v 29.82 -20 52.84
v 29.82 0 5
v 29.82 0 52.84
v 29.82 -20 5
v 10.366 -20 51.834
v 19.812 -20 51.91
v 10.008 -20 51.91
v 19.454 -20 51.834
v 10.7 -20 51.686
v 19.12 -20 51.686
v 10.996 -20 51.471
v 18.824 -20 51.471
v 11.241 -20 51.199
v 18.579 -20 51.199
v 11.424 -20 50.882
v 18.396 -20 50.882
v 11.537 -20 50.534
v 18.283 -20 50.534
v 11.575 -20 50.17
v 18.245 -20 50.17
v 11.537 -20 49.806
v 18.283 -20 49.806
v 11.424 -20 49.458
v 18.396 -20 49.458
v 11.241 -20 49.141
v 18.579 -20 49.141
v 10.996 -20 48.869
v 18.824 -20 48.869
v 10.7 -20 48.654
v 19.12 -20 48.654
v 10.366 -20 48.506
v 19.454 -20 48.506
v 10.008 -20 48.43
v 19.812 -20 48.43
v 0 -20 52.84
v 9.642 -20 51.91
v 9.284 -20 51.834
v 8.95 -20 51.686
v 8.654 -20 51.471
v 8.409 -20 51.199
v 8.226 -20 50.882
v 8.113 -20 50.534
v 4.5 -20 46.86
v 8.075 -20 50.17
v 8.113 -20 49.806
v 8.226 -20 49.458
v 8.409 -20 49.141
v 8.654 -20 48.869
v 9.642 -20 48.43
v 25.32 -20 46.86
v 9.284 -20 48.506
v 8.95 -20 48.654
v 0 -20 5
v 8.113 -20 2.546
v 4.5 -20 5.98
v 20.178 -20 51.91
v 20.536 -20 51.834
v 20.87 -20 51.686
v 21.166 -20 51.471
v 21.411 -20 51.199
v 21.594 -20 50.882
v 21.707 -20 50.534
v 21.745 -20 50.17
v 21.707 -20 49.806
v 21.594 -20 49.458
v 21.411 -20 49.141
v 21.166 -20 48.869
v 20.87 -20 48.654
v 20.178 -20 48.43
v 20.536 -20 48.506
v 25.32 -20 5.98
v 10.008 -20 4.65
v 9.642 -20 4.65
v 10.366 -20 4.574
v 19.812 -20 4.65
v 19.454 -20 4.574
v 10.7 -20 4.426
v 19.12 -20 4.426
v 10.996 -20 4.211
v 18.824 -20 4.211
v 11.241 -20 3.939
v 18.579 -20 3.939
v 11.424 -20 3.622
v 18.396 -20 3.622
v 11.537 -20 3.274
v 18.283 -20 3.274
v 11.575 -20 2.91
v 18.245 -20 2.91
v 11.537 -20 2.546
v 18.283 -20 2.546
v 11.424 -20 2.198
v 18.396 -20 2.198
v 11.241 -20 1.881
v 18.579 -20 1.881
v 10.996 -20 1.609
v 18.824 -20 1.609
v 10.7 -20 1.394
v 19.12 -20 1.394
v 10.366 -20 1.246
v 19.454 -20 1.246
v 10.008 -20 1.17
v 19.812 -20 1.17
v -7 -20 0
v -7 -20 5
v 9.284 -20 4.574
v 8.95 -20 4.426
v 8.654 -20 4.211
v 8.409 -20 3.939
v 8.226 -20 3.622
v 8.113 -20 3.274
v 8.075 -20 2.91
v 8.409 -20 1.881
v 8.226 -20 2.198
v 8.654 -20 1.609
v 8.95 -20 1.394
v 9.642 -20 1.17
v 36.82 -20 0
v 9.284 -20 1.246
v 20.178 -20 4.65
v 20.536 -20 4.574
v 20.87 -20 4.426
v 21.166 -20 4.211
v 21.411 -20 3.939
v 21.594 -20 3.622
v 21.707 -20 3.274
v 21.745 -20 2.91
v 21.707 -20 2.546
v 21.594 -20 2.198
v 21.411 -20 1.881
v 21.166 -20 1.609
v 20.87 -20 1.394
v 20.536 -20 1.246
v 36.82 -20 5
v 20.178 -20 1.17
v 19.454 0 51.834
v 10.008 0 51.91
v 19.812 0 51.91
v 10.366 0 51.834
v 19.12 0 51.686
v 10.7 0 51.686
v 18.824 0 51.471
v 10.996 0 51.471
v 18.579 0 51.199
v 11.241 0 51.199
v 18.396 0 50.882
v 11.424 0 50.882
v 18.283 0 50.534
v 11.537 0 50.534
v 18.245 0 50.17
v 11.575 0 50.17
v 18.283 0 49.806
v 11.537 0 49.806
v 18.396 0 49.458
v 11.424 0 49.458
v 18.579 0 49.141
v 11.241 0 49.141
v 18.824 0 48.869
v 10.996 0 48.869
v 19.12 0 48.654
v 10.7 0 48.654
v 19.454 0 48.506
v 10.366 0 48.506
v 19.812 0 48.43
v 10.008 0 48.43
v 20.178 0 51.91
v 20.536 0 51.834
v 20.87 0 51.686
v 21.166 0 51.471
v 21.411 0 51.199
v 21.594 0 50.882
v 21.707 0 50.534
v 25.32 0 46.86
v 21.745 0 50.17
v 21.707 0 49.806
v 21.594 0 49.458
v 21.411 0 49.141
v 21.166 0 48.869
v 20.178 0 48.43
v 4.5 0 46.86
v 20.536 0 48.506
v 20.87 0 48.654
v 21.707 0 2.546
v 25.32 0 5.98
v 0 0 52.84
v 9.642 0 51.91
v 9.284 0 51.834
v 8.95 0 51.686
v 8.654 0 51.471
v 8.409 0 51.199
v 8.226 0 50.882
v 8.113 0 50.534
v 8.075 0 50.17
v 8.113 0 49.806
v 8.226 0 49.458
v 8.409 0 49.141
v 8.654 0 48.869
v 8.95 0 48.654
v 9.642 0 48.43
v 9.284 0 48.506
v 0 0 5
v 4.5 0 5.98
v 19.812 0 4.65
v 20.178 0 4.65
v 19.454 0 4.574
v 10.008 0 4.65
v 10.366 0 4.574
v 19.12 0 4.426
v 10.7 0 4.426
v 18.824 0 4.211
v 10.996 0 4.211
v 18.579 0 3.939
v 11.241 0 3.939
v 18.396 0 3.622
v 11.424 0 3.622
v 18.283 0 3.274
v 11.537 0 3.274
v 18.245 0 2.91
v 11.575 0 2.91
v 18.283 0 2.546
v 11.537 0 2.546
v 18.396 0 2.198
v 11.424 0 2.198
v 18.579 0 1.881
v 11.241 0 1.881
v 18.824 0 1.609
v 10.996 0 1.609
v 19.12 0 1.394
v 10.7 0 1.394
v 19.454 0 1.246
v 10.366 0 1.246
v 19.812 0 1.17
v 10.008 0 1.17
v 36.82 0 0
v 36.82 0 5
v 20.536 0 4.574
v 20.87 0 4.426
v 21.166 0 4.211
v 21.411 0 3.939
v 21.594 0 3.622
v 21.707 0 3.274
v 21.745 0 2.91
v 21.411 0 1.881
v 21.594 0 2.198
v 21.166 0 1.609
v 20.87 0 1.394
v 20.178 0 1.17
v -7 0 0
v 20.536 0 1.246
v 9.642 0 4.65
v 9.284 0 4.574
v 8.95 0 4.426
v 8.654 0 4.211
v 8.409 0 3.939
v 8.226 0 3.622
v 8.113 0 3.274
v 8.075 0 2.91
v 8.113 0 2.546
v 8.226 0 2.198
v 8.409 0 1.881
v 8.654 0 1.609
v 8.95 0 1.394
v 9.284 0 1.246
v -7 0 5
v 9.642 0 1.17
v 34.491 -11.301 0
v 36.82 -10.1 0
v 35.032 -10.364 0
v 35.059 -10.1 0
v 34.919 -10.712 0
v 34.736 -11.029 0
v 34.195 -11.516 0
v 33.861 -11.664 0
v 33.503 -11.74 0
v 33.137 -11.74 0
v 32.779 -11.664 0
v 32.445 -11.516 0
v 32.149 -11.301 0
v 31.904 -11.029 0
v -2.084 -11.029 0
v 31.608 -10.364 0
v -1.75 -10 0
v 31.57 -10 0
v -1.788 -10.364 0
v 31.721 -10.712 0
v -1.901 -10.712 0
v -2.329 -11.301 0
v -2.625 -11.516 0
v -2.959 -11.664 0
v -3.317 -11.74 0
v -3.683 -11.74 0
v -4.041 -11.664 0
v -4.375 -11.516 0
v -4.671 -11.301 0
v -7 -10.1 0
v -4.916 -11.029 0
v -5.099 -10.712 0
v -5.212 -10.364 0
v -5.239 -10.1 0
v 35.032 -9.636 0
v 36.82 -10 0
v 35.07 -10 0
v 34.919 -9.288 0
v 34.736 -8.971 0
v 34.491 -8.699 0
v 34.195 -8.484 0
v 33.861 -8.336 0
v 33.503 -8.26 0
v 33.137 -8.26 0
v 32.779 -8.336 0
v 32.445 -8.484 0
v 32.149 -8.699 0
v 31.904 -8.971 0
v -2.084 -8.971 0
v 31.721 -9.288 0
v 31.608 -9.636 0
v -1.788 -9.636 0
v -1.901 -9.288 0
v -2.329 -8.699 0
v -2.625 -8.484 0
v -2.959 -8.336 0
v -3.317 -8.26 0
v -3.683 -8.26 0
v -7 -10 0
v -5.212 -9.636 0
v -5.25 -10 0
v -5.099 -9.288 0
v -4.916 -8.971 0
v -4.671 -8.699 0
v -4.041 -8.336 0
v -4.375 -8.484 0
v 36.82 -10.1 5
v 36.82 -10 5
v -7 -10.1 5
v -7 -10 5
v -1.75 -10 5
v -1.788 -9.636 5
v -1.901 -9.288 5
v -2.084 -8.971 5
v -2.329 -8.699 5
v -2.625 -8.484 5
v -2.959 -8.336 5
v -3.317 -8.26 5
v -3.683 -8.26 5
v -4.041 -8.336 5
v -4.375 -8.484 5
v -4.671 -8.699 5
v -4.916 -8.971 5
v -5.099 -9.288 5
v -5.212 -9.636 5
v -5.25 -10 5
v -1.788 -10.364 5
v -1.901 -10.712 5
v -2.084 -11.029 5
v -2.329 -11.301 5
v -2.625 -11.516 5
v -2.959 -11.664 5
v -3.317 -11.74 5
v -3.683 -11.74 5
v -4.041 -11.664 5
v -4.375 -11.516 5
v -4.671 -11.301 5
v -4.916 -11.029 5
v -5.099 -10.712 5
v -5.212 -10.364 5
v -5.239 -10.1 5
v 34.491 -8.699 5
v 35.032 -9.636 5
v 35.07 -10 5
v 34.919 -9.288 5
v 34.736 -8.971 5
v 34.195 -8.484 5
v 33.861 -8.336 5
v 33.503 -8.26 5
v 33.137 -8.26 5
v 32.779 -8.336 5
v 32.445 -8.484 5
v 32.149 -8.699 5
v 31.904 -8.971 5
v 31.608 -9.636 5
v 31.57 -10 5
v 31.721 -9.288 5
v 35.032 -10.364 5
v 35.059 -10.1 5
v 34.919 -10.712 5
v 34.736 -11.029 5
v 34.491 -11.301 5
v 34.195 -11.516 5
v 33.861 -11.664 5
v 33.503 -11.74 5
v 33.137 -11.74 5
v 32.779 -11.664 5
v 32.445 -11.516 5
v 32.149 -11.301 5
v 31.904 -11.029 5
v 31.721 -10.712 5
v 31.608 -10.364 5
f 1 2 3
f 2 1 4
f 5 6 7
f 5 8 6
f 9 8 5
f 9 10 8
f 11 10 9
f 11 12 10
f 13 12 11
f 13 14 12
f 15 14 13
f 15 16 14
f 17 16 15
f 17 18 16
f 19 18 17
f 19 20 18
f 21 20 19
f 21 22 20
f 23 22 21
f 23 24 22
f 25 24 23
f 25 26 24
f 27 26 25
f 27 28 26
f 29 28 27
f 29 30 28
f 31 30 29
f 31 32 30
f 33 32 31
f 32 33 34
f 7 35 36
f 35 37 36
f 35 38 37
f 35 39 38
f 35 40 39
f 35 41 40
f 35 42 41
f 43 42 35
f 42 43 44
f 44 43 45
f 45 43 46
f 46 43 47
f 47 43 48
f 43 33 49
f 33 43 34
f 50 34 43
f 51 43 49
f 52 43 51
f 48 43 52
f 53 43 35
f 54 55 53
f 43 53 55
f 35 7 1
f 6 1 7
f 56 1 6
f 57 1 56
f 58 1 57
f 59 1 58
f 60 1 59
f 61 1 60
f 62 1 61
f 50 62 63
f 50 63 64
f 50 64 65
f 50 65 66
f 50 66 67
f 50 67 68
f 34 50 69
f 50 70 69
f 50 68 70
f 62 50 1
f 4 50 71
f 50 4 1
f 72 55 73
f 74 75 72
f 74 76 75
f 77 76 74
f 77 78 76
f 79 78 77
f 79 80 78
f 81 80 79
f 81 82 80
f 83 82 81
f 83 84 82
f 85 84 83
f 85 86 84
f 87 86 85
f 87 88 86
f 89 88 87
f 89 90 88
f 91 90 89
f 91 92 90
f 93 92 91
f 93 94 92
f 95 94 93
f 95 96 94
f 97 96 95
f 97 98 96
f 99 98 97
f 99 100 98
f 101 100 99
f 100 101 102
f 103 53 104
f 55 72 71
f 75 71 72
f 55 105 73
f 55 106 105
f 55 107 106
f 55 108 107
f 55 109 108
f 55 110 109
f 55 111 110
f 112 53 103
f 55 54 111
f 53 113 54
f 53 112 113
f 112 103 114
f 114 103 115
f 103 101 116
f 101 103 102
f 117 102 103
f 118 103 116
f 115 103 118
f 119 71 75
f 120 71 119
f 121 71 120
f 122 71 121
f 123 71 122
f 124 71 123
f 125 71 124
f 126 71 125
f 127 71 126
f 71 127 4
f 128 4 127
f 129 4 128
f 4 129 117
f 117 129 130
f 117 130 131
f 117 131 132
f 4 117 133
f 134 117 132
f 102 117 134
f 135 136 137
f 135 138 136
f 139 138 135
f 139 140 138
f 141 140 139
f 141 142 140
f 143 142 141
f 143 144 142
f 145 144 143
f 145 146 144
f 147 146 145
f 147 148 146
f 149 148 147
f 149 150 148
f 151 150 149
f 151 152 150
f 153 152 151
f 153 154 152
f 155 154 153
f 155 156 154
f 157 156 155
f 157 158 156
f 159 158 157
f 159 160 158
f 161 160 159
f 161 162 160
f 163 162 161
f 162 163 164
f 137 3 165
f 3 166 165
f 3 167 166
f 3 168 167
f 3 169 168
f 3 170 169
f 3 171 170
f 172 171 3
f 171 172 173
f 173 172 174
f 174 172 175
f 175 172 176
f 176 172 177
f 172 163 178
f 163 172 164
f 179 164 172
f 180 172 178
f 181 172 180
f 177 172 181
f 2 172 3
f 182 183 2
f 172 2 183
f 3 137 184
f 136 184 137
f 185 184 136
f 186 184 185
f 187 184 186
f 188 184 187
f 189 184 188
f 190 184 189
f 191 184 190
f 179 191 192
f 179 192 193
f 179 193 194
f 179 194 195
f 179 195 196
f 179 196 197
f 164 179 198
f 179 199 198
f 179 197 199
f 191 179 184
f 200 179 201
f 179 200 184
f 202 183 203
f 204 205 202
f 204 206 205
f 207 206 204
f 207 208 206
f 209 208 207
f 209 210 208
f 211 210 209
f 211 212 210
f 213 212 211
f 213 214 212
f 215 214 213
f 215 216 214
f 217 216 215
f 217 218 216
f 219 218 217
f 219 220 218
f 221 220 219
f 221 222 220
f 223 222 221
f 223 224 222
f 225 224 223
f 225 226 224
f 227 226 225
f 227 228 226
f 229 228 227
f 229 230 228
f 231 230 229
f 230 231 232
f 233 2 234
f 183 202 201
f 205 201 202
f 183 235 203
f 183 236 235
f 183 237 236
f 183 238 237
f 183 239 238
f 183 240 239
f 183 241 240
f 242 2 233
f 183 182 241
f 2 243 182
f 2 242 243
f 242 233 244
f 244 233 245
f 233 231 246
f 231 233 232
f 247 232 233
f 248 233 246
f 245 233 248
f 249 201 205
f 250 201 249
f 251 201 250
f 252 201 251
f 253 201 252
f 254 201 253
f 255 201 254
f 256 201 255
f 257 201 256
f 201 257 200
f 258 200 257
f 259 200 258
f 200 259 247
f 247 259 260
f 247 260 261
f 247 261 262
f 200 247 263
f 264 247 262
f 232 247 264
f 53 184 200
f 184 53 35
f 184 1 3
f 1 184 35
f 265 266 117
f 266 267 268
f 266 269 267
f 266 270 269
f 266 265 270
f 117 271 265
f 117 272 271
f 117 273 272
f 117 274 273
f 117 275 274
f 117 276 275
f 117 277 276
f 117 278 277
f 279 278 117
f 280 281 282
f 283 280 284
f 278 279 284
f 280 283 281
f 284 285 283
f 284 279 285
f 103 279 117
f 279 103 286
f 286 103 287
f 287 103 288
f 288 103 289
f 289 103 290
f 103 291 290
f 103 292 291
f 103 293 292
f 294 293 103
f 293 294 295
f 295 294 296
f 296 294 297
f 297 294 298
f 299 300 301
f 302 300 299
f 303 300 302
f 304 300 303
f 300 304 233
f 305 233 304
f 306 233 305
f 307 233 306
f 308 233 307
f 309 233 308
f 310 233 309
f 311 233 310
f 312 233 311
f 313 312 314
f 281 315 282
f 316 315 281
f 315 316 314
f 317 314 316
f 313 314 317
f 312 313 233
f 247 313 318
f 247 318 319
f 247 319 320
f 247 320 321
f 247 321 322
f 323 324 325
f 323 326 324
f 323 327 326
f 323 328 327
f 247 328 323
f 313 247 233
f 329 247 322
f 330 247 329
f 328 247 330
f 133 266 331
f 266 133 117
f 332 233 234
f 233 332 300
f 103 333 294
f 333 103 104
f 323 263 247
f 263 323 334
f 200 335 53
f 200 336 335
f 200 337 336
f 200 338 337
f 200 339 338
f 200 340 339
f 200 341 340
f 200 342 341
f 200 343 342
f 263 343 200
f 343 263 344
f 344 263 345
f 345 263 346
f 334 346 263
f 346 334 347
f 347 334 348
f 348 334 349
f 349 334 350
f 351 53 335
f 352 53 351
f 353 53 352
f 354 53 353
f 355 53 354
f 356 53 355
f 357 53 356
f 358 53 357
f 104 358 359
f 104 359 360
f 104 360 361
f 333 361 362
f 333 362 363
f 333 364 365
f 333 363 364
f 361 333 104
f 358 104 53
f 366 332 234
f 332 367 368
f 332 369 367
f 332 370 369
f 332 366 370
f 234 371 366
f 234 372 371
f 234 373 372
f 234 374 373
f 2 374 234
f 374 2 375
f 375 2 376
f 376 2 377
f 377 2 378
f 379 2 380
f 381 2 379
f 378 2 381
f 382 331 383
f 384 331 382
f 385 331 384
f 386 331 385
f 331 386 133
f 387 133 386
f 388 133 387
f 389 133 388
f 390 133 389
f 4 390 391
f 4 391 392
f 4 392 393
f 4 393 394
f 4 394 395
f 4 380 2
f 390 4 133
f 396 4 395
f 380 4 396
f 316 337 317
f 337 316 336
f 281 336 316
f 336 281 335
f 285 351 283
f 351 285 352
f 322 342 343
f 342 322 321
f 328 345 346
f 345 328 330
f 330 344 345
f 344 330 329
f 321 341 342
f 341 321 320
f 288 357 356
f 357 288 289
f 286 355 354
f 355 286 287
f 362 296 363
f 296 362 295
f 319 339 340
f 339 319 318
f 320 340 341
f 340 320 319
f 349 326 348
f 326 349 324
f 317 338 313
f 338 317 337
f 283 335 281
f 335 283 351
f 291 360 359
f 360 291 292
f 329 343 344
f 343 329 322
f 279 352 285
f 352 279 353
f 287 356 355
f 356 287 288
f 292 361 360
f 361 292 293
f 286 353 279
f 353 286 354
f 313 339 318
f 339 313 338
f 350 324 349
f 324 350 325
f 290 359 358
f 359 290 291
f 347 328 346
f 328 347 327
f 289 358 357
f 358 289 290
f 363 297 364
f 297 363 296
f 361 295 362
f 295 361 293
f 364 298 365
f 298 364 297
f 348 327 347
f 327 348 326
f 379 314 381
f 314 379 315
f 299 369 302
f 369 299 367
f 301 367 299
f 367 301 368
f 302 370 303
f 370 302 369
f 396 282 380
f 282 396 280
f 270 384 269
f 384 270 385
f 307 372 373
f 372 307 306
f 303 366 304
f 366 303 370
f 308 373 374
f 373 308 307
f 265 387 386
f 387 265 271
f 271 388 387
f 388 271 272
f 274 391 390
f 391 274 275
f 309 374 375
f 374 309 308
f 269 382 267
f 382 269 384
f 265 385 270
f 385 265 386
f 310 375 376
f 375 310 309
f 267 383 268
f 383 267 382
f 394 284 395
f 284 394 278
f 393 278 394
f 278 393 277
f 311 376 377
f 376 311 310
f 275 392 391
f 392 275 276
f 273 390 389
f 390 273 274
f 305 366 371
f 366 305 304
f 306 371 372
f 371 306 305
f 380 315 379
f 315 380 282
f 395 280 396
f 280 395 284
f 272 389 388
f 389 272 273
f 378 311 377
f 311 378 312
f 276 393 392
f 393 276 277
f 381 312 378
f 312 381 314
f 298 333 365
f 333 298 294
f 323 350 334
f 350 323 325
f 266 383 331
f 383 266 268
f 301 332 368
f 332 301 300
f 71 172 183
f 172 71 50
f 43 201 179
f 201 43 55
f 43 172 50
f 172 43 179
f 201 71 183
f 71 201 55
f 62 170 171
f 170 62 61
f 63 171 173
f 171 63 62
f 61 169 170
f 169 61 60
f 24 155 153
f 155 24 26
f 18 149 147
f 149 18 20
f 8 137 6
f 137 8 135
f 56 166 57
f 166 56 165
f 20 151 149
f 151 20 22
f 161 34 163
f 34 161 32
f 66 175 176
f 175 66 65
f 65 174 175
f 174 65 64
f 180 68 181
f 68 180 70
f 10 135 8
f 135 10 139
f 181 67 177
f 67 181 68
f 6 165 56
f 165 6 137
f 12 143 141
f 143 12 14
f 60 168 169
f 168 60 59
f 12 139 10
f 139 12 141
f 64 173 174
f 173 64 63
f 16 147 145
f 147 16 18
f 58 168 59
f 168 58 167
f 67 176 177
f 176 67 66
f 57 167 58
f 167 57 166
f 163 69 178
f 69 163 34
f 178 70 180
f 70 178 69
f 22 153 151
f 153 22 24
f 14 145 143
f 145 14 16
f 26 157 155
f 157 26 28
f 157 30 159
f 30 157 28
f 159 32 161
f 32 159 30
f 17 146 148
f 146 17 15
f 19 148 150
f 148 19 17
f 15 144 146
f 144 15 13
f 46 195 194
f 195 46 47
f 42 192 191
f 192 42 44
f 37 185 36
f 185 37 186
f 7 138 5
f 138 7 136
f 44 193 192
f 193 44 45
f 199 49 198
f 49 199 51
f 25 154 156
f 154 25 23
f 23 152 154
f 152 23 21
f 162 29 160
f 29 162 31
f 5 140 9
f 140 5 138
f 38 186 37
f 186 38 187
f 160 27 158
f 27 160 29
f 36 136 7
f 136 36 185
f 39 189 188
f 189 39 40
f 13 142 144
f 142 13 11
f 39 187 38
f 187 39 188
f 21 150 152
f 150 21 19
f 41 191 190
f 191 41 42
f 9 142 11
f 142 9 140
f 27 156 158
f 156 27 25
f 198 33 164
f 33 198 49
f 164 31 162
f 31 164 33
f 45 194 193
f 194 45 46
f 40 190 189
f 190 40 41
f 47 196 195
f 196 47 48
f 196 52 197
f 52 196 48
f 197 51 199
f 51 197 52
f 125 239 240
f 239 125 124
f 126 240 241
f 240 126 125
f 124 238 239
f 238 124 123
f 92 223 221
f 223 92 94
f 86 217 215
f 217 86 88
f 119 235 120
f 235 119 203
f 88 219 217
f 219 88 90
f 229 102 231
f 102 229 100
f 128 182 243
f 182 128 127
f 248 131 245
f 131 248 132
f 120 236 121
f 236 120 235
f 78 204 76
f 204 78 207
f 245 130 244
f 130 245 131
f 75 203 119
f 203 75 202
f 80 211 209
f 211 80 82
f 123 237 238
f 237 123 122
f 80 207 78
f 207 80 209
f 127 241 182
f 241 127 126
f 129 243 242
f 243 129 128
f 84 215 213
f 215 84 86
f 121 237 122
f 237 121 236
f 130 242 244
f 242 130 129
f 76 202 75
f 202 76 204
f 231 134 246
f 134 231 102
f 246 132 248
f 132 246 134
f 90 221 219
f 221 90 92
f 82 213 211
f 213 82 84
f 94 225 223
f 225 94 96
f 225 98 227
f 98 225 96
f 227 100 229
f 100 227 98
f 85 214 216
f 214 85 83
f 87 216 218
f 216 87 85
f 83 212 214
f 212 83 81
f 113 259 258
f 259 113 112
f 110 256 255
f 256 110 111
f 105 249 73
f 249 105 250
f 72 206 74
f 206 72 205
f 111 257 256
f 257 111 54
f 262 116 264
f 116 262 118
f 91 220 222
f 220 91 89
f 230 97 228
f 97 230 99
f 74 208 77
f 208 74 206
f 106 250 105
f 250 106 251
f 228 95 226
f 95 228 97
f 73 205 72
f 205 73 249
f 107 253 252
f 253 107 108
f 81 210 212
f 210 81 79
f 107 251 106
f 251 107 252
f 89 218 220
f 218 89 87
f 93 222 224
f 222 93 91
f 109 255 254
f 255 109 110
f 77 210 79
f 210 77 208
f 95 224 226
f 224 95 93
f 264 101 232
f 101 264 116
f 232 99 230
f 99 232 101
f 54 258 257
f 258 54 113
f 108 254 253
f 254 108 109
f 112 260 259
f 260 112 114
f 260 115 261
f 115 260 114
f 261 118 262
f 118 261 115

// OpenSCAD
//pulled from http://www.servocity.com/html/hs-311_standard.html
a = 19.82;
b = 13.47;
c = 33.79;
d = 10.17;
e =  9.66;
f = 30.22;
g = 11.68;
h = 26.67;
j = 52.84;
k =  9.35;
l =  4.38;
m = 39.88;
x =  3.05;
spline = 5;


//hs311_servo();
servo_mount();

module servo_mount()
{
	$fs = 0.1;
	
	wall = 5;
	bolt = 3.5;
	width = a+wall*2;
	height = j;
	depth = wall*4;
	splineX = (a/2+wall);
	splineY = (j-(j-m)/2-e);

	//translate([-splineX, -splineY, -(depth+1)])
	rotate([90, 0, 0])
	{
		difference()
		{
			//the main mount body.
			union()
			{
				cube([width, height, depth]); // large vertical piece
				translate([-bolt*2, 0, 0])
					cube([width+bolt*4, wall, depth]); //mounting flanges
			}
			
			//bolt holes for flange
			translate([-bolt, -1, depth/2])
				rotate([-90,0,0])
					cylinder(r=bolt/2, h=wall+2);
			translate([width+bolt, -1, depth/2])
				rotate([-90,0,0])
					cylinder(r=bolt/2, h=wall+2);
					
			//bolt hole cutouts for flange
			translate([-bolt*3, -1, depth/2])
				cube([bolt*2, wall*2, 0.1]);
			translate([width+bolt, 0-1, depth/2])
				cube([bolt*2, wall*2, 0.1]);
		
			//cutout for servo
			translate([wall-0.5, (j-m-1)/2, -1])
				cube([a+1, m+1, h+2]);
				
			//mounting holes for the servo.
			translate([a/2+wall+d/2, splineY+b, -1])
				cylinder(r=bolt/2, h=depth+2);
			translate([a/2+wall-d/2, splineY+b, -1])
				cylinder(r=bolt/2, h=depth+2);
			translate([a/2+wall+d/2, splineY-c, -1])
				cylinder(r=bolt/2, h=depth+2);
			translate([a/2+wall-d/2, splineY-c, -1])
				cylinder(r=bolt/2, h=depth+2);
		}
	}
}

module hs311_servo()
{
	$fs = 0.1;
	
	difference()
	{
		//center the servo on the spline shaft output
		translate([-a/2, -f, -h])
		{
			union()
			{
				//main housing of servo
				cube([a, m, h+k]);
		
				//flanged sides
				translate([0, -(j-m)/2, h])
					cube([a, j, 2]);
			
				//servo spline
				translate([a/2, m-e, h+g])
					cylinder(r=spline/2, h=x);
				translate([a/2, m-e, 0])
					cylinder(r=spline*1.5, h=h+g);  //TODO: radius needs real measurement.
			}
		}
		
		//mounting holes for the servo.
		translate([d/2, b, 0])
			cylinder(r=l/2, h=k, center=true);
		translate([-d/2, b, 0])
			cylinder(r=l/2, h=k, center=true);
		translate([d/2, -c, 0])
			cylinder(r=l/2, h=k, center=true);
		translate([-d/2, -c, 0])
			cylinder(r=l/2, h=k, center=true);		
	}
}
